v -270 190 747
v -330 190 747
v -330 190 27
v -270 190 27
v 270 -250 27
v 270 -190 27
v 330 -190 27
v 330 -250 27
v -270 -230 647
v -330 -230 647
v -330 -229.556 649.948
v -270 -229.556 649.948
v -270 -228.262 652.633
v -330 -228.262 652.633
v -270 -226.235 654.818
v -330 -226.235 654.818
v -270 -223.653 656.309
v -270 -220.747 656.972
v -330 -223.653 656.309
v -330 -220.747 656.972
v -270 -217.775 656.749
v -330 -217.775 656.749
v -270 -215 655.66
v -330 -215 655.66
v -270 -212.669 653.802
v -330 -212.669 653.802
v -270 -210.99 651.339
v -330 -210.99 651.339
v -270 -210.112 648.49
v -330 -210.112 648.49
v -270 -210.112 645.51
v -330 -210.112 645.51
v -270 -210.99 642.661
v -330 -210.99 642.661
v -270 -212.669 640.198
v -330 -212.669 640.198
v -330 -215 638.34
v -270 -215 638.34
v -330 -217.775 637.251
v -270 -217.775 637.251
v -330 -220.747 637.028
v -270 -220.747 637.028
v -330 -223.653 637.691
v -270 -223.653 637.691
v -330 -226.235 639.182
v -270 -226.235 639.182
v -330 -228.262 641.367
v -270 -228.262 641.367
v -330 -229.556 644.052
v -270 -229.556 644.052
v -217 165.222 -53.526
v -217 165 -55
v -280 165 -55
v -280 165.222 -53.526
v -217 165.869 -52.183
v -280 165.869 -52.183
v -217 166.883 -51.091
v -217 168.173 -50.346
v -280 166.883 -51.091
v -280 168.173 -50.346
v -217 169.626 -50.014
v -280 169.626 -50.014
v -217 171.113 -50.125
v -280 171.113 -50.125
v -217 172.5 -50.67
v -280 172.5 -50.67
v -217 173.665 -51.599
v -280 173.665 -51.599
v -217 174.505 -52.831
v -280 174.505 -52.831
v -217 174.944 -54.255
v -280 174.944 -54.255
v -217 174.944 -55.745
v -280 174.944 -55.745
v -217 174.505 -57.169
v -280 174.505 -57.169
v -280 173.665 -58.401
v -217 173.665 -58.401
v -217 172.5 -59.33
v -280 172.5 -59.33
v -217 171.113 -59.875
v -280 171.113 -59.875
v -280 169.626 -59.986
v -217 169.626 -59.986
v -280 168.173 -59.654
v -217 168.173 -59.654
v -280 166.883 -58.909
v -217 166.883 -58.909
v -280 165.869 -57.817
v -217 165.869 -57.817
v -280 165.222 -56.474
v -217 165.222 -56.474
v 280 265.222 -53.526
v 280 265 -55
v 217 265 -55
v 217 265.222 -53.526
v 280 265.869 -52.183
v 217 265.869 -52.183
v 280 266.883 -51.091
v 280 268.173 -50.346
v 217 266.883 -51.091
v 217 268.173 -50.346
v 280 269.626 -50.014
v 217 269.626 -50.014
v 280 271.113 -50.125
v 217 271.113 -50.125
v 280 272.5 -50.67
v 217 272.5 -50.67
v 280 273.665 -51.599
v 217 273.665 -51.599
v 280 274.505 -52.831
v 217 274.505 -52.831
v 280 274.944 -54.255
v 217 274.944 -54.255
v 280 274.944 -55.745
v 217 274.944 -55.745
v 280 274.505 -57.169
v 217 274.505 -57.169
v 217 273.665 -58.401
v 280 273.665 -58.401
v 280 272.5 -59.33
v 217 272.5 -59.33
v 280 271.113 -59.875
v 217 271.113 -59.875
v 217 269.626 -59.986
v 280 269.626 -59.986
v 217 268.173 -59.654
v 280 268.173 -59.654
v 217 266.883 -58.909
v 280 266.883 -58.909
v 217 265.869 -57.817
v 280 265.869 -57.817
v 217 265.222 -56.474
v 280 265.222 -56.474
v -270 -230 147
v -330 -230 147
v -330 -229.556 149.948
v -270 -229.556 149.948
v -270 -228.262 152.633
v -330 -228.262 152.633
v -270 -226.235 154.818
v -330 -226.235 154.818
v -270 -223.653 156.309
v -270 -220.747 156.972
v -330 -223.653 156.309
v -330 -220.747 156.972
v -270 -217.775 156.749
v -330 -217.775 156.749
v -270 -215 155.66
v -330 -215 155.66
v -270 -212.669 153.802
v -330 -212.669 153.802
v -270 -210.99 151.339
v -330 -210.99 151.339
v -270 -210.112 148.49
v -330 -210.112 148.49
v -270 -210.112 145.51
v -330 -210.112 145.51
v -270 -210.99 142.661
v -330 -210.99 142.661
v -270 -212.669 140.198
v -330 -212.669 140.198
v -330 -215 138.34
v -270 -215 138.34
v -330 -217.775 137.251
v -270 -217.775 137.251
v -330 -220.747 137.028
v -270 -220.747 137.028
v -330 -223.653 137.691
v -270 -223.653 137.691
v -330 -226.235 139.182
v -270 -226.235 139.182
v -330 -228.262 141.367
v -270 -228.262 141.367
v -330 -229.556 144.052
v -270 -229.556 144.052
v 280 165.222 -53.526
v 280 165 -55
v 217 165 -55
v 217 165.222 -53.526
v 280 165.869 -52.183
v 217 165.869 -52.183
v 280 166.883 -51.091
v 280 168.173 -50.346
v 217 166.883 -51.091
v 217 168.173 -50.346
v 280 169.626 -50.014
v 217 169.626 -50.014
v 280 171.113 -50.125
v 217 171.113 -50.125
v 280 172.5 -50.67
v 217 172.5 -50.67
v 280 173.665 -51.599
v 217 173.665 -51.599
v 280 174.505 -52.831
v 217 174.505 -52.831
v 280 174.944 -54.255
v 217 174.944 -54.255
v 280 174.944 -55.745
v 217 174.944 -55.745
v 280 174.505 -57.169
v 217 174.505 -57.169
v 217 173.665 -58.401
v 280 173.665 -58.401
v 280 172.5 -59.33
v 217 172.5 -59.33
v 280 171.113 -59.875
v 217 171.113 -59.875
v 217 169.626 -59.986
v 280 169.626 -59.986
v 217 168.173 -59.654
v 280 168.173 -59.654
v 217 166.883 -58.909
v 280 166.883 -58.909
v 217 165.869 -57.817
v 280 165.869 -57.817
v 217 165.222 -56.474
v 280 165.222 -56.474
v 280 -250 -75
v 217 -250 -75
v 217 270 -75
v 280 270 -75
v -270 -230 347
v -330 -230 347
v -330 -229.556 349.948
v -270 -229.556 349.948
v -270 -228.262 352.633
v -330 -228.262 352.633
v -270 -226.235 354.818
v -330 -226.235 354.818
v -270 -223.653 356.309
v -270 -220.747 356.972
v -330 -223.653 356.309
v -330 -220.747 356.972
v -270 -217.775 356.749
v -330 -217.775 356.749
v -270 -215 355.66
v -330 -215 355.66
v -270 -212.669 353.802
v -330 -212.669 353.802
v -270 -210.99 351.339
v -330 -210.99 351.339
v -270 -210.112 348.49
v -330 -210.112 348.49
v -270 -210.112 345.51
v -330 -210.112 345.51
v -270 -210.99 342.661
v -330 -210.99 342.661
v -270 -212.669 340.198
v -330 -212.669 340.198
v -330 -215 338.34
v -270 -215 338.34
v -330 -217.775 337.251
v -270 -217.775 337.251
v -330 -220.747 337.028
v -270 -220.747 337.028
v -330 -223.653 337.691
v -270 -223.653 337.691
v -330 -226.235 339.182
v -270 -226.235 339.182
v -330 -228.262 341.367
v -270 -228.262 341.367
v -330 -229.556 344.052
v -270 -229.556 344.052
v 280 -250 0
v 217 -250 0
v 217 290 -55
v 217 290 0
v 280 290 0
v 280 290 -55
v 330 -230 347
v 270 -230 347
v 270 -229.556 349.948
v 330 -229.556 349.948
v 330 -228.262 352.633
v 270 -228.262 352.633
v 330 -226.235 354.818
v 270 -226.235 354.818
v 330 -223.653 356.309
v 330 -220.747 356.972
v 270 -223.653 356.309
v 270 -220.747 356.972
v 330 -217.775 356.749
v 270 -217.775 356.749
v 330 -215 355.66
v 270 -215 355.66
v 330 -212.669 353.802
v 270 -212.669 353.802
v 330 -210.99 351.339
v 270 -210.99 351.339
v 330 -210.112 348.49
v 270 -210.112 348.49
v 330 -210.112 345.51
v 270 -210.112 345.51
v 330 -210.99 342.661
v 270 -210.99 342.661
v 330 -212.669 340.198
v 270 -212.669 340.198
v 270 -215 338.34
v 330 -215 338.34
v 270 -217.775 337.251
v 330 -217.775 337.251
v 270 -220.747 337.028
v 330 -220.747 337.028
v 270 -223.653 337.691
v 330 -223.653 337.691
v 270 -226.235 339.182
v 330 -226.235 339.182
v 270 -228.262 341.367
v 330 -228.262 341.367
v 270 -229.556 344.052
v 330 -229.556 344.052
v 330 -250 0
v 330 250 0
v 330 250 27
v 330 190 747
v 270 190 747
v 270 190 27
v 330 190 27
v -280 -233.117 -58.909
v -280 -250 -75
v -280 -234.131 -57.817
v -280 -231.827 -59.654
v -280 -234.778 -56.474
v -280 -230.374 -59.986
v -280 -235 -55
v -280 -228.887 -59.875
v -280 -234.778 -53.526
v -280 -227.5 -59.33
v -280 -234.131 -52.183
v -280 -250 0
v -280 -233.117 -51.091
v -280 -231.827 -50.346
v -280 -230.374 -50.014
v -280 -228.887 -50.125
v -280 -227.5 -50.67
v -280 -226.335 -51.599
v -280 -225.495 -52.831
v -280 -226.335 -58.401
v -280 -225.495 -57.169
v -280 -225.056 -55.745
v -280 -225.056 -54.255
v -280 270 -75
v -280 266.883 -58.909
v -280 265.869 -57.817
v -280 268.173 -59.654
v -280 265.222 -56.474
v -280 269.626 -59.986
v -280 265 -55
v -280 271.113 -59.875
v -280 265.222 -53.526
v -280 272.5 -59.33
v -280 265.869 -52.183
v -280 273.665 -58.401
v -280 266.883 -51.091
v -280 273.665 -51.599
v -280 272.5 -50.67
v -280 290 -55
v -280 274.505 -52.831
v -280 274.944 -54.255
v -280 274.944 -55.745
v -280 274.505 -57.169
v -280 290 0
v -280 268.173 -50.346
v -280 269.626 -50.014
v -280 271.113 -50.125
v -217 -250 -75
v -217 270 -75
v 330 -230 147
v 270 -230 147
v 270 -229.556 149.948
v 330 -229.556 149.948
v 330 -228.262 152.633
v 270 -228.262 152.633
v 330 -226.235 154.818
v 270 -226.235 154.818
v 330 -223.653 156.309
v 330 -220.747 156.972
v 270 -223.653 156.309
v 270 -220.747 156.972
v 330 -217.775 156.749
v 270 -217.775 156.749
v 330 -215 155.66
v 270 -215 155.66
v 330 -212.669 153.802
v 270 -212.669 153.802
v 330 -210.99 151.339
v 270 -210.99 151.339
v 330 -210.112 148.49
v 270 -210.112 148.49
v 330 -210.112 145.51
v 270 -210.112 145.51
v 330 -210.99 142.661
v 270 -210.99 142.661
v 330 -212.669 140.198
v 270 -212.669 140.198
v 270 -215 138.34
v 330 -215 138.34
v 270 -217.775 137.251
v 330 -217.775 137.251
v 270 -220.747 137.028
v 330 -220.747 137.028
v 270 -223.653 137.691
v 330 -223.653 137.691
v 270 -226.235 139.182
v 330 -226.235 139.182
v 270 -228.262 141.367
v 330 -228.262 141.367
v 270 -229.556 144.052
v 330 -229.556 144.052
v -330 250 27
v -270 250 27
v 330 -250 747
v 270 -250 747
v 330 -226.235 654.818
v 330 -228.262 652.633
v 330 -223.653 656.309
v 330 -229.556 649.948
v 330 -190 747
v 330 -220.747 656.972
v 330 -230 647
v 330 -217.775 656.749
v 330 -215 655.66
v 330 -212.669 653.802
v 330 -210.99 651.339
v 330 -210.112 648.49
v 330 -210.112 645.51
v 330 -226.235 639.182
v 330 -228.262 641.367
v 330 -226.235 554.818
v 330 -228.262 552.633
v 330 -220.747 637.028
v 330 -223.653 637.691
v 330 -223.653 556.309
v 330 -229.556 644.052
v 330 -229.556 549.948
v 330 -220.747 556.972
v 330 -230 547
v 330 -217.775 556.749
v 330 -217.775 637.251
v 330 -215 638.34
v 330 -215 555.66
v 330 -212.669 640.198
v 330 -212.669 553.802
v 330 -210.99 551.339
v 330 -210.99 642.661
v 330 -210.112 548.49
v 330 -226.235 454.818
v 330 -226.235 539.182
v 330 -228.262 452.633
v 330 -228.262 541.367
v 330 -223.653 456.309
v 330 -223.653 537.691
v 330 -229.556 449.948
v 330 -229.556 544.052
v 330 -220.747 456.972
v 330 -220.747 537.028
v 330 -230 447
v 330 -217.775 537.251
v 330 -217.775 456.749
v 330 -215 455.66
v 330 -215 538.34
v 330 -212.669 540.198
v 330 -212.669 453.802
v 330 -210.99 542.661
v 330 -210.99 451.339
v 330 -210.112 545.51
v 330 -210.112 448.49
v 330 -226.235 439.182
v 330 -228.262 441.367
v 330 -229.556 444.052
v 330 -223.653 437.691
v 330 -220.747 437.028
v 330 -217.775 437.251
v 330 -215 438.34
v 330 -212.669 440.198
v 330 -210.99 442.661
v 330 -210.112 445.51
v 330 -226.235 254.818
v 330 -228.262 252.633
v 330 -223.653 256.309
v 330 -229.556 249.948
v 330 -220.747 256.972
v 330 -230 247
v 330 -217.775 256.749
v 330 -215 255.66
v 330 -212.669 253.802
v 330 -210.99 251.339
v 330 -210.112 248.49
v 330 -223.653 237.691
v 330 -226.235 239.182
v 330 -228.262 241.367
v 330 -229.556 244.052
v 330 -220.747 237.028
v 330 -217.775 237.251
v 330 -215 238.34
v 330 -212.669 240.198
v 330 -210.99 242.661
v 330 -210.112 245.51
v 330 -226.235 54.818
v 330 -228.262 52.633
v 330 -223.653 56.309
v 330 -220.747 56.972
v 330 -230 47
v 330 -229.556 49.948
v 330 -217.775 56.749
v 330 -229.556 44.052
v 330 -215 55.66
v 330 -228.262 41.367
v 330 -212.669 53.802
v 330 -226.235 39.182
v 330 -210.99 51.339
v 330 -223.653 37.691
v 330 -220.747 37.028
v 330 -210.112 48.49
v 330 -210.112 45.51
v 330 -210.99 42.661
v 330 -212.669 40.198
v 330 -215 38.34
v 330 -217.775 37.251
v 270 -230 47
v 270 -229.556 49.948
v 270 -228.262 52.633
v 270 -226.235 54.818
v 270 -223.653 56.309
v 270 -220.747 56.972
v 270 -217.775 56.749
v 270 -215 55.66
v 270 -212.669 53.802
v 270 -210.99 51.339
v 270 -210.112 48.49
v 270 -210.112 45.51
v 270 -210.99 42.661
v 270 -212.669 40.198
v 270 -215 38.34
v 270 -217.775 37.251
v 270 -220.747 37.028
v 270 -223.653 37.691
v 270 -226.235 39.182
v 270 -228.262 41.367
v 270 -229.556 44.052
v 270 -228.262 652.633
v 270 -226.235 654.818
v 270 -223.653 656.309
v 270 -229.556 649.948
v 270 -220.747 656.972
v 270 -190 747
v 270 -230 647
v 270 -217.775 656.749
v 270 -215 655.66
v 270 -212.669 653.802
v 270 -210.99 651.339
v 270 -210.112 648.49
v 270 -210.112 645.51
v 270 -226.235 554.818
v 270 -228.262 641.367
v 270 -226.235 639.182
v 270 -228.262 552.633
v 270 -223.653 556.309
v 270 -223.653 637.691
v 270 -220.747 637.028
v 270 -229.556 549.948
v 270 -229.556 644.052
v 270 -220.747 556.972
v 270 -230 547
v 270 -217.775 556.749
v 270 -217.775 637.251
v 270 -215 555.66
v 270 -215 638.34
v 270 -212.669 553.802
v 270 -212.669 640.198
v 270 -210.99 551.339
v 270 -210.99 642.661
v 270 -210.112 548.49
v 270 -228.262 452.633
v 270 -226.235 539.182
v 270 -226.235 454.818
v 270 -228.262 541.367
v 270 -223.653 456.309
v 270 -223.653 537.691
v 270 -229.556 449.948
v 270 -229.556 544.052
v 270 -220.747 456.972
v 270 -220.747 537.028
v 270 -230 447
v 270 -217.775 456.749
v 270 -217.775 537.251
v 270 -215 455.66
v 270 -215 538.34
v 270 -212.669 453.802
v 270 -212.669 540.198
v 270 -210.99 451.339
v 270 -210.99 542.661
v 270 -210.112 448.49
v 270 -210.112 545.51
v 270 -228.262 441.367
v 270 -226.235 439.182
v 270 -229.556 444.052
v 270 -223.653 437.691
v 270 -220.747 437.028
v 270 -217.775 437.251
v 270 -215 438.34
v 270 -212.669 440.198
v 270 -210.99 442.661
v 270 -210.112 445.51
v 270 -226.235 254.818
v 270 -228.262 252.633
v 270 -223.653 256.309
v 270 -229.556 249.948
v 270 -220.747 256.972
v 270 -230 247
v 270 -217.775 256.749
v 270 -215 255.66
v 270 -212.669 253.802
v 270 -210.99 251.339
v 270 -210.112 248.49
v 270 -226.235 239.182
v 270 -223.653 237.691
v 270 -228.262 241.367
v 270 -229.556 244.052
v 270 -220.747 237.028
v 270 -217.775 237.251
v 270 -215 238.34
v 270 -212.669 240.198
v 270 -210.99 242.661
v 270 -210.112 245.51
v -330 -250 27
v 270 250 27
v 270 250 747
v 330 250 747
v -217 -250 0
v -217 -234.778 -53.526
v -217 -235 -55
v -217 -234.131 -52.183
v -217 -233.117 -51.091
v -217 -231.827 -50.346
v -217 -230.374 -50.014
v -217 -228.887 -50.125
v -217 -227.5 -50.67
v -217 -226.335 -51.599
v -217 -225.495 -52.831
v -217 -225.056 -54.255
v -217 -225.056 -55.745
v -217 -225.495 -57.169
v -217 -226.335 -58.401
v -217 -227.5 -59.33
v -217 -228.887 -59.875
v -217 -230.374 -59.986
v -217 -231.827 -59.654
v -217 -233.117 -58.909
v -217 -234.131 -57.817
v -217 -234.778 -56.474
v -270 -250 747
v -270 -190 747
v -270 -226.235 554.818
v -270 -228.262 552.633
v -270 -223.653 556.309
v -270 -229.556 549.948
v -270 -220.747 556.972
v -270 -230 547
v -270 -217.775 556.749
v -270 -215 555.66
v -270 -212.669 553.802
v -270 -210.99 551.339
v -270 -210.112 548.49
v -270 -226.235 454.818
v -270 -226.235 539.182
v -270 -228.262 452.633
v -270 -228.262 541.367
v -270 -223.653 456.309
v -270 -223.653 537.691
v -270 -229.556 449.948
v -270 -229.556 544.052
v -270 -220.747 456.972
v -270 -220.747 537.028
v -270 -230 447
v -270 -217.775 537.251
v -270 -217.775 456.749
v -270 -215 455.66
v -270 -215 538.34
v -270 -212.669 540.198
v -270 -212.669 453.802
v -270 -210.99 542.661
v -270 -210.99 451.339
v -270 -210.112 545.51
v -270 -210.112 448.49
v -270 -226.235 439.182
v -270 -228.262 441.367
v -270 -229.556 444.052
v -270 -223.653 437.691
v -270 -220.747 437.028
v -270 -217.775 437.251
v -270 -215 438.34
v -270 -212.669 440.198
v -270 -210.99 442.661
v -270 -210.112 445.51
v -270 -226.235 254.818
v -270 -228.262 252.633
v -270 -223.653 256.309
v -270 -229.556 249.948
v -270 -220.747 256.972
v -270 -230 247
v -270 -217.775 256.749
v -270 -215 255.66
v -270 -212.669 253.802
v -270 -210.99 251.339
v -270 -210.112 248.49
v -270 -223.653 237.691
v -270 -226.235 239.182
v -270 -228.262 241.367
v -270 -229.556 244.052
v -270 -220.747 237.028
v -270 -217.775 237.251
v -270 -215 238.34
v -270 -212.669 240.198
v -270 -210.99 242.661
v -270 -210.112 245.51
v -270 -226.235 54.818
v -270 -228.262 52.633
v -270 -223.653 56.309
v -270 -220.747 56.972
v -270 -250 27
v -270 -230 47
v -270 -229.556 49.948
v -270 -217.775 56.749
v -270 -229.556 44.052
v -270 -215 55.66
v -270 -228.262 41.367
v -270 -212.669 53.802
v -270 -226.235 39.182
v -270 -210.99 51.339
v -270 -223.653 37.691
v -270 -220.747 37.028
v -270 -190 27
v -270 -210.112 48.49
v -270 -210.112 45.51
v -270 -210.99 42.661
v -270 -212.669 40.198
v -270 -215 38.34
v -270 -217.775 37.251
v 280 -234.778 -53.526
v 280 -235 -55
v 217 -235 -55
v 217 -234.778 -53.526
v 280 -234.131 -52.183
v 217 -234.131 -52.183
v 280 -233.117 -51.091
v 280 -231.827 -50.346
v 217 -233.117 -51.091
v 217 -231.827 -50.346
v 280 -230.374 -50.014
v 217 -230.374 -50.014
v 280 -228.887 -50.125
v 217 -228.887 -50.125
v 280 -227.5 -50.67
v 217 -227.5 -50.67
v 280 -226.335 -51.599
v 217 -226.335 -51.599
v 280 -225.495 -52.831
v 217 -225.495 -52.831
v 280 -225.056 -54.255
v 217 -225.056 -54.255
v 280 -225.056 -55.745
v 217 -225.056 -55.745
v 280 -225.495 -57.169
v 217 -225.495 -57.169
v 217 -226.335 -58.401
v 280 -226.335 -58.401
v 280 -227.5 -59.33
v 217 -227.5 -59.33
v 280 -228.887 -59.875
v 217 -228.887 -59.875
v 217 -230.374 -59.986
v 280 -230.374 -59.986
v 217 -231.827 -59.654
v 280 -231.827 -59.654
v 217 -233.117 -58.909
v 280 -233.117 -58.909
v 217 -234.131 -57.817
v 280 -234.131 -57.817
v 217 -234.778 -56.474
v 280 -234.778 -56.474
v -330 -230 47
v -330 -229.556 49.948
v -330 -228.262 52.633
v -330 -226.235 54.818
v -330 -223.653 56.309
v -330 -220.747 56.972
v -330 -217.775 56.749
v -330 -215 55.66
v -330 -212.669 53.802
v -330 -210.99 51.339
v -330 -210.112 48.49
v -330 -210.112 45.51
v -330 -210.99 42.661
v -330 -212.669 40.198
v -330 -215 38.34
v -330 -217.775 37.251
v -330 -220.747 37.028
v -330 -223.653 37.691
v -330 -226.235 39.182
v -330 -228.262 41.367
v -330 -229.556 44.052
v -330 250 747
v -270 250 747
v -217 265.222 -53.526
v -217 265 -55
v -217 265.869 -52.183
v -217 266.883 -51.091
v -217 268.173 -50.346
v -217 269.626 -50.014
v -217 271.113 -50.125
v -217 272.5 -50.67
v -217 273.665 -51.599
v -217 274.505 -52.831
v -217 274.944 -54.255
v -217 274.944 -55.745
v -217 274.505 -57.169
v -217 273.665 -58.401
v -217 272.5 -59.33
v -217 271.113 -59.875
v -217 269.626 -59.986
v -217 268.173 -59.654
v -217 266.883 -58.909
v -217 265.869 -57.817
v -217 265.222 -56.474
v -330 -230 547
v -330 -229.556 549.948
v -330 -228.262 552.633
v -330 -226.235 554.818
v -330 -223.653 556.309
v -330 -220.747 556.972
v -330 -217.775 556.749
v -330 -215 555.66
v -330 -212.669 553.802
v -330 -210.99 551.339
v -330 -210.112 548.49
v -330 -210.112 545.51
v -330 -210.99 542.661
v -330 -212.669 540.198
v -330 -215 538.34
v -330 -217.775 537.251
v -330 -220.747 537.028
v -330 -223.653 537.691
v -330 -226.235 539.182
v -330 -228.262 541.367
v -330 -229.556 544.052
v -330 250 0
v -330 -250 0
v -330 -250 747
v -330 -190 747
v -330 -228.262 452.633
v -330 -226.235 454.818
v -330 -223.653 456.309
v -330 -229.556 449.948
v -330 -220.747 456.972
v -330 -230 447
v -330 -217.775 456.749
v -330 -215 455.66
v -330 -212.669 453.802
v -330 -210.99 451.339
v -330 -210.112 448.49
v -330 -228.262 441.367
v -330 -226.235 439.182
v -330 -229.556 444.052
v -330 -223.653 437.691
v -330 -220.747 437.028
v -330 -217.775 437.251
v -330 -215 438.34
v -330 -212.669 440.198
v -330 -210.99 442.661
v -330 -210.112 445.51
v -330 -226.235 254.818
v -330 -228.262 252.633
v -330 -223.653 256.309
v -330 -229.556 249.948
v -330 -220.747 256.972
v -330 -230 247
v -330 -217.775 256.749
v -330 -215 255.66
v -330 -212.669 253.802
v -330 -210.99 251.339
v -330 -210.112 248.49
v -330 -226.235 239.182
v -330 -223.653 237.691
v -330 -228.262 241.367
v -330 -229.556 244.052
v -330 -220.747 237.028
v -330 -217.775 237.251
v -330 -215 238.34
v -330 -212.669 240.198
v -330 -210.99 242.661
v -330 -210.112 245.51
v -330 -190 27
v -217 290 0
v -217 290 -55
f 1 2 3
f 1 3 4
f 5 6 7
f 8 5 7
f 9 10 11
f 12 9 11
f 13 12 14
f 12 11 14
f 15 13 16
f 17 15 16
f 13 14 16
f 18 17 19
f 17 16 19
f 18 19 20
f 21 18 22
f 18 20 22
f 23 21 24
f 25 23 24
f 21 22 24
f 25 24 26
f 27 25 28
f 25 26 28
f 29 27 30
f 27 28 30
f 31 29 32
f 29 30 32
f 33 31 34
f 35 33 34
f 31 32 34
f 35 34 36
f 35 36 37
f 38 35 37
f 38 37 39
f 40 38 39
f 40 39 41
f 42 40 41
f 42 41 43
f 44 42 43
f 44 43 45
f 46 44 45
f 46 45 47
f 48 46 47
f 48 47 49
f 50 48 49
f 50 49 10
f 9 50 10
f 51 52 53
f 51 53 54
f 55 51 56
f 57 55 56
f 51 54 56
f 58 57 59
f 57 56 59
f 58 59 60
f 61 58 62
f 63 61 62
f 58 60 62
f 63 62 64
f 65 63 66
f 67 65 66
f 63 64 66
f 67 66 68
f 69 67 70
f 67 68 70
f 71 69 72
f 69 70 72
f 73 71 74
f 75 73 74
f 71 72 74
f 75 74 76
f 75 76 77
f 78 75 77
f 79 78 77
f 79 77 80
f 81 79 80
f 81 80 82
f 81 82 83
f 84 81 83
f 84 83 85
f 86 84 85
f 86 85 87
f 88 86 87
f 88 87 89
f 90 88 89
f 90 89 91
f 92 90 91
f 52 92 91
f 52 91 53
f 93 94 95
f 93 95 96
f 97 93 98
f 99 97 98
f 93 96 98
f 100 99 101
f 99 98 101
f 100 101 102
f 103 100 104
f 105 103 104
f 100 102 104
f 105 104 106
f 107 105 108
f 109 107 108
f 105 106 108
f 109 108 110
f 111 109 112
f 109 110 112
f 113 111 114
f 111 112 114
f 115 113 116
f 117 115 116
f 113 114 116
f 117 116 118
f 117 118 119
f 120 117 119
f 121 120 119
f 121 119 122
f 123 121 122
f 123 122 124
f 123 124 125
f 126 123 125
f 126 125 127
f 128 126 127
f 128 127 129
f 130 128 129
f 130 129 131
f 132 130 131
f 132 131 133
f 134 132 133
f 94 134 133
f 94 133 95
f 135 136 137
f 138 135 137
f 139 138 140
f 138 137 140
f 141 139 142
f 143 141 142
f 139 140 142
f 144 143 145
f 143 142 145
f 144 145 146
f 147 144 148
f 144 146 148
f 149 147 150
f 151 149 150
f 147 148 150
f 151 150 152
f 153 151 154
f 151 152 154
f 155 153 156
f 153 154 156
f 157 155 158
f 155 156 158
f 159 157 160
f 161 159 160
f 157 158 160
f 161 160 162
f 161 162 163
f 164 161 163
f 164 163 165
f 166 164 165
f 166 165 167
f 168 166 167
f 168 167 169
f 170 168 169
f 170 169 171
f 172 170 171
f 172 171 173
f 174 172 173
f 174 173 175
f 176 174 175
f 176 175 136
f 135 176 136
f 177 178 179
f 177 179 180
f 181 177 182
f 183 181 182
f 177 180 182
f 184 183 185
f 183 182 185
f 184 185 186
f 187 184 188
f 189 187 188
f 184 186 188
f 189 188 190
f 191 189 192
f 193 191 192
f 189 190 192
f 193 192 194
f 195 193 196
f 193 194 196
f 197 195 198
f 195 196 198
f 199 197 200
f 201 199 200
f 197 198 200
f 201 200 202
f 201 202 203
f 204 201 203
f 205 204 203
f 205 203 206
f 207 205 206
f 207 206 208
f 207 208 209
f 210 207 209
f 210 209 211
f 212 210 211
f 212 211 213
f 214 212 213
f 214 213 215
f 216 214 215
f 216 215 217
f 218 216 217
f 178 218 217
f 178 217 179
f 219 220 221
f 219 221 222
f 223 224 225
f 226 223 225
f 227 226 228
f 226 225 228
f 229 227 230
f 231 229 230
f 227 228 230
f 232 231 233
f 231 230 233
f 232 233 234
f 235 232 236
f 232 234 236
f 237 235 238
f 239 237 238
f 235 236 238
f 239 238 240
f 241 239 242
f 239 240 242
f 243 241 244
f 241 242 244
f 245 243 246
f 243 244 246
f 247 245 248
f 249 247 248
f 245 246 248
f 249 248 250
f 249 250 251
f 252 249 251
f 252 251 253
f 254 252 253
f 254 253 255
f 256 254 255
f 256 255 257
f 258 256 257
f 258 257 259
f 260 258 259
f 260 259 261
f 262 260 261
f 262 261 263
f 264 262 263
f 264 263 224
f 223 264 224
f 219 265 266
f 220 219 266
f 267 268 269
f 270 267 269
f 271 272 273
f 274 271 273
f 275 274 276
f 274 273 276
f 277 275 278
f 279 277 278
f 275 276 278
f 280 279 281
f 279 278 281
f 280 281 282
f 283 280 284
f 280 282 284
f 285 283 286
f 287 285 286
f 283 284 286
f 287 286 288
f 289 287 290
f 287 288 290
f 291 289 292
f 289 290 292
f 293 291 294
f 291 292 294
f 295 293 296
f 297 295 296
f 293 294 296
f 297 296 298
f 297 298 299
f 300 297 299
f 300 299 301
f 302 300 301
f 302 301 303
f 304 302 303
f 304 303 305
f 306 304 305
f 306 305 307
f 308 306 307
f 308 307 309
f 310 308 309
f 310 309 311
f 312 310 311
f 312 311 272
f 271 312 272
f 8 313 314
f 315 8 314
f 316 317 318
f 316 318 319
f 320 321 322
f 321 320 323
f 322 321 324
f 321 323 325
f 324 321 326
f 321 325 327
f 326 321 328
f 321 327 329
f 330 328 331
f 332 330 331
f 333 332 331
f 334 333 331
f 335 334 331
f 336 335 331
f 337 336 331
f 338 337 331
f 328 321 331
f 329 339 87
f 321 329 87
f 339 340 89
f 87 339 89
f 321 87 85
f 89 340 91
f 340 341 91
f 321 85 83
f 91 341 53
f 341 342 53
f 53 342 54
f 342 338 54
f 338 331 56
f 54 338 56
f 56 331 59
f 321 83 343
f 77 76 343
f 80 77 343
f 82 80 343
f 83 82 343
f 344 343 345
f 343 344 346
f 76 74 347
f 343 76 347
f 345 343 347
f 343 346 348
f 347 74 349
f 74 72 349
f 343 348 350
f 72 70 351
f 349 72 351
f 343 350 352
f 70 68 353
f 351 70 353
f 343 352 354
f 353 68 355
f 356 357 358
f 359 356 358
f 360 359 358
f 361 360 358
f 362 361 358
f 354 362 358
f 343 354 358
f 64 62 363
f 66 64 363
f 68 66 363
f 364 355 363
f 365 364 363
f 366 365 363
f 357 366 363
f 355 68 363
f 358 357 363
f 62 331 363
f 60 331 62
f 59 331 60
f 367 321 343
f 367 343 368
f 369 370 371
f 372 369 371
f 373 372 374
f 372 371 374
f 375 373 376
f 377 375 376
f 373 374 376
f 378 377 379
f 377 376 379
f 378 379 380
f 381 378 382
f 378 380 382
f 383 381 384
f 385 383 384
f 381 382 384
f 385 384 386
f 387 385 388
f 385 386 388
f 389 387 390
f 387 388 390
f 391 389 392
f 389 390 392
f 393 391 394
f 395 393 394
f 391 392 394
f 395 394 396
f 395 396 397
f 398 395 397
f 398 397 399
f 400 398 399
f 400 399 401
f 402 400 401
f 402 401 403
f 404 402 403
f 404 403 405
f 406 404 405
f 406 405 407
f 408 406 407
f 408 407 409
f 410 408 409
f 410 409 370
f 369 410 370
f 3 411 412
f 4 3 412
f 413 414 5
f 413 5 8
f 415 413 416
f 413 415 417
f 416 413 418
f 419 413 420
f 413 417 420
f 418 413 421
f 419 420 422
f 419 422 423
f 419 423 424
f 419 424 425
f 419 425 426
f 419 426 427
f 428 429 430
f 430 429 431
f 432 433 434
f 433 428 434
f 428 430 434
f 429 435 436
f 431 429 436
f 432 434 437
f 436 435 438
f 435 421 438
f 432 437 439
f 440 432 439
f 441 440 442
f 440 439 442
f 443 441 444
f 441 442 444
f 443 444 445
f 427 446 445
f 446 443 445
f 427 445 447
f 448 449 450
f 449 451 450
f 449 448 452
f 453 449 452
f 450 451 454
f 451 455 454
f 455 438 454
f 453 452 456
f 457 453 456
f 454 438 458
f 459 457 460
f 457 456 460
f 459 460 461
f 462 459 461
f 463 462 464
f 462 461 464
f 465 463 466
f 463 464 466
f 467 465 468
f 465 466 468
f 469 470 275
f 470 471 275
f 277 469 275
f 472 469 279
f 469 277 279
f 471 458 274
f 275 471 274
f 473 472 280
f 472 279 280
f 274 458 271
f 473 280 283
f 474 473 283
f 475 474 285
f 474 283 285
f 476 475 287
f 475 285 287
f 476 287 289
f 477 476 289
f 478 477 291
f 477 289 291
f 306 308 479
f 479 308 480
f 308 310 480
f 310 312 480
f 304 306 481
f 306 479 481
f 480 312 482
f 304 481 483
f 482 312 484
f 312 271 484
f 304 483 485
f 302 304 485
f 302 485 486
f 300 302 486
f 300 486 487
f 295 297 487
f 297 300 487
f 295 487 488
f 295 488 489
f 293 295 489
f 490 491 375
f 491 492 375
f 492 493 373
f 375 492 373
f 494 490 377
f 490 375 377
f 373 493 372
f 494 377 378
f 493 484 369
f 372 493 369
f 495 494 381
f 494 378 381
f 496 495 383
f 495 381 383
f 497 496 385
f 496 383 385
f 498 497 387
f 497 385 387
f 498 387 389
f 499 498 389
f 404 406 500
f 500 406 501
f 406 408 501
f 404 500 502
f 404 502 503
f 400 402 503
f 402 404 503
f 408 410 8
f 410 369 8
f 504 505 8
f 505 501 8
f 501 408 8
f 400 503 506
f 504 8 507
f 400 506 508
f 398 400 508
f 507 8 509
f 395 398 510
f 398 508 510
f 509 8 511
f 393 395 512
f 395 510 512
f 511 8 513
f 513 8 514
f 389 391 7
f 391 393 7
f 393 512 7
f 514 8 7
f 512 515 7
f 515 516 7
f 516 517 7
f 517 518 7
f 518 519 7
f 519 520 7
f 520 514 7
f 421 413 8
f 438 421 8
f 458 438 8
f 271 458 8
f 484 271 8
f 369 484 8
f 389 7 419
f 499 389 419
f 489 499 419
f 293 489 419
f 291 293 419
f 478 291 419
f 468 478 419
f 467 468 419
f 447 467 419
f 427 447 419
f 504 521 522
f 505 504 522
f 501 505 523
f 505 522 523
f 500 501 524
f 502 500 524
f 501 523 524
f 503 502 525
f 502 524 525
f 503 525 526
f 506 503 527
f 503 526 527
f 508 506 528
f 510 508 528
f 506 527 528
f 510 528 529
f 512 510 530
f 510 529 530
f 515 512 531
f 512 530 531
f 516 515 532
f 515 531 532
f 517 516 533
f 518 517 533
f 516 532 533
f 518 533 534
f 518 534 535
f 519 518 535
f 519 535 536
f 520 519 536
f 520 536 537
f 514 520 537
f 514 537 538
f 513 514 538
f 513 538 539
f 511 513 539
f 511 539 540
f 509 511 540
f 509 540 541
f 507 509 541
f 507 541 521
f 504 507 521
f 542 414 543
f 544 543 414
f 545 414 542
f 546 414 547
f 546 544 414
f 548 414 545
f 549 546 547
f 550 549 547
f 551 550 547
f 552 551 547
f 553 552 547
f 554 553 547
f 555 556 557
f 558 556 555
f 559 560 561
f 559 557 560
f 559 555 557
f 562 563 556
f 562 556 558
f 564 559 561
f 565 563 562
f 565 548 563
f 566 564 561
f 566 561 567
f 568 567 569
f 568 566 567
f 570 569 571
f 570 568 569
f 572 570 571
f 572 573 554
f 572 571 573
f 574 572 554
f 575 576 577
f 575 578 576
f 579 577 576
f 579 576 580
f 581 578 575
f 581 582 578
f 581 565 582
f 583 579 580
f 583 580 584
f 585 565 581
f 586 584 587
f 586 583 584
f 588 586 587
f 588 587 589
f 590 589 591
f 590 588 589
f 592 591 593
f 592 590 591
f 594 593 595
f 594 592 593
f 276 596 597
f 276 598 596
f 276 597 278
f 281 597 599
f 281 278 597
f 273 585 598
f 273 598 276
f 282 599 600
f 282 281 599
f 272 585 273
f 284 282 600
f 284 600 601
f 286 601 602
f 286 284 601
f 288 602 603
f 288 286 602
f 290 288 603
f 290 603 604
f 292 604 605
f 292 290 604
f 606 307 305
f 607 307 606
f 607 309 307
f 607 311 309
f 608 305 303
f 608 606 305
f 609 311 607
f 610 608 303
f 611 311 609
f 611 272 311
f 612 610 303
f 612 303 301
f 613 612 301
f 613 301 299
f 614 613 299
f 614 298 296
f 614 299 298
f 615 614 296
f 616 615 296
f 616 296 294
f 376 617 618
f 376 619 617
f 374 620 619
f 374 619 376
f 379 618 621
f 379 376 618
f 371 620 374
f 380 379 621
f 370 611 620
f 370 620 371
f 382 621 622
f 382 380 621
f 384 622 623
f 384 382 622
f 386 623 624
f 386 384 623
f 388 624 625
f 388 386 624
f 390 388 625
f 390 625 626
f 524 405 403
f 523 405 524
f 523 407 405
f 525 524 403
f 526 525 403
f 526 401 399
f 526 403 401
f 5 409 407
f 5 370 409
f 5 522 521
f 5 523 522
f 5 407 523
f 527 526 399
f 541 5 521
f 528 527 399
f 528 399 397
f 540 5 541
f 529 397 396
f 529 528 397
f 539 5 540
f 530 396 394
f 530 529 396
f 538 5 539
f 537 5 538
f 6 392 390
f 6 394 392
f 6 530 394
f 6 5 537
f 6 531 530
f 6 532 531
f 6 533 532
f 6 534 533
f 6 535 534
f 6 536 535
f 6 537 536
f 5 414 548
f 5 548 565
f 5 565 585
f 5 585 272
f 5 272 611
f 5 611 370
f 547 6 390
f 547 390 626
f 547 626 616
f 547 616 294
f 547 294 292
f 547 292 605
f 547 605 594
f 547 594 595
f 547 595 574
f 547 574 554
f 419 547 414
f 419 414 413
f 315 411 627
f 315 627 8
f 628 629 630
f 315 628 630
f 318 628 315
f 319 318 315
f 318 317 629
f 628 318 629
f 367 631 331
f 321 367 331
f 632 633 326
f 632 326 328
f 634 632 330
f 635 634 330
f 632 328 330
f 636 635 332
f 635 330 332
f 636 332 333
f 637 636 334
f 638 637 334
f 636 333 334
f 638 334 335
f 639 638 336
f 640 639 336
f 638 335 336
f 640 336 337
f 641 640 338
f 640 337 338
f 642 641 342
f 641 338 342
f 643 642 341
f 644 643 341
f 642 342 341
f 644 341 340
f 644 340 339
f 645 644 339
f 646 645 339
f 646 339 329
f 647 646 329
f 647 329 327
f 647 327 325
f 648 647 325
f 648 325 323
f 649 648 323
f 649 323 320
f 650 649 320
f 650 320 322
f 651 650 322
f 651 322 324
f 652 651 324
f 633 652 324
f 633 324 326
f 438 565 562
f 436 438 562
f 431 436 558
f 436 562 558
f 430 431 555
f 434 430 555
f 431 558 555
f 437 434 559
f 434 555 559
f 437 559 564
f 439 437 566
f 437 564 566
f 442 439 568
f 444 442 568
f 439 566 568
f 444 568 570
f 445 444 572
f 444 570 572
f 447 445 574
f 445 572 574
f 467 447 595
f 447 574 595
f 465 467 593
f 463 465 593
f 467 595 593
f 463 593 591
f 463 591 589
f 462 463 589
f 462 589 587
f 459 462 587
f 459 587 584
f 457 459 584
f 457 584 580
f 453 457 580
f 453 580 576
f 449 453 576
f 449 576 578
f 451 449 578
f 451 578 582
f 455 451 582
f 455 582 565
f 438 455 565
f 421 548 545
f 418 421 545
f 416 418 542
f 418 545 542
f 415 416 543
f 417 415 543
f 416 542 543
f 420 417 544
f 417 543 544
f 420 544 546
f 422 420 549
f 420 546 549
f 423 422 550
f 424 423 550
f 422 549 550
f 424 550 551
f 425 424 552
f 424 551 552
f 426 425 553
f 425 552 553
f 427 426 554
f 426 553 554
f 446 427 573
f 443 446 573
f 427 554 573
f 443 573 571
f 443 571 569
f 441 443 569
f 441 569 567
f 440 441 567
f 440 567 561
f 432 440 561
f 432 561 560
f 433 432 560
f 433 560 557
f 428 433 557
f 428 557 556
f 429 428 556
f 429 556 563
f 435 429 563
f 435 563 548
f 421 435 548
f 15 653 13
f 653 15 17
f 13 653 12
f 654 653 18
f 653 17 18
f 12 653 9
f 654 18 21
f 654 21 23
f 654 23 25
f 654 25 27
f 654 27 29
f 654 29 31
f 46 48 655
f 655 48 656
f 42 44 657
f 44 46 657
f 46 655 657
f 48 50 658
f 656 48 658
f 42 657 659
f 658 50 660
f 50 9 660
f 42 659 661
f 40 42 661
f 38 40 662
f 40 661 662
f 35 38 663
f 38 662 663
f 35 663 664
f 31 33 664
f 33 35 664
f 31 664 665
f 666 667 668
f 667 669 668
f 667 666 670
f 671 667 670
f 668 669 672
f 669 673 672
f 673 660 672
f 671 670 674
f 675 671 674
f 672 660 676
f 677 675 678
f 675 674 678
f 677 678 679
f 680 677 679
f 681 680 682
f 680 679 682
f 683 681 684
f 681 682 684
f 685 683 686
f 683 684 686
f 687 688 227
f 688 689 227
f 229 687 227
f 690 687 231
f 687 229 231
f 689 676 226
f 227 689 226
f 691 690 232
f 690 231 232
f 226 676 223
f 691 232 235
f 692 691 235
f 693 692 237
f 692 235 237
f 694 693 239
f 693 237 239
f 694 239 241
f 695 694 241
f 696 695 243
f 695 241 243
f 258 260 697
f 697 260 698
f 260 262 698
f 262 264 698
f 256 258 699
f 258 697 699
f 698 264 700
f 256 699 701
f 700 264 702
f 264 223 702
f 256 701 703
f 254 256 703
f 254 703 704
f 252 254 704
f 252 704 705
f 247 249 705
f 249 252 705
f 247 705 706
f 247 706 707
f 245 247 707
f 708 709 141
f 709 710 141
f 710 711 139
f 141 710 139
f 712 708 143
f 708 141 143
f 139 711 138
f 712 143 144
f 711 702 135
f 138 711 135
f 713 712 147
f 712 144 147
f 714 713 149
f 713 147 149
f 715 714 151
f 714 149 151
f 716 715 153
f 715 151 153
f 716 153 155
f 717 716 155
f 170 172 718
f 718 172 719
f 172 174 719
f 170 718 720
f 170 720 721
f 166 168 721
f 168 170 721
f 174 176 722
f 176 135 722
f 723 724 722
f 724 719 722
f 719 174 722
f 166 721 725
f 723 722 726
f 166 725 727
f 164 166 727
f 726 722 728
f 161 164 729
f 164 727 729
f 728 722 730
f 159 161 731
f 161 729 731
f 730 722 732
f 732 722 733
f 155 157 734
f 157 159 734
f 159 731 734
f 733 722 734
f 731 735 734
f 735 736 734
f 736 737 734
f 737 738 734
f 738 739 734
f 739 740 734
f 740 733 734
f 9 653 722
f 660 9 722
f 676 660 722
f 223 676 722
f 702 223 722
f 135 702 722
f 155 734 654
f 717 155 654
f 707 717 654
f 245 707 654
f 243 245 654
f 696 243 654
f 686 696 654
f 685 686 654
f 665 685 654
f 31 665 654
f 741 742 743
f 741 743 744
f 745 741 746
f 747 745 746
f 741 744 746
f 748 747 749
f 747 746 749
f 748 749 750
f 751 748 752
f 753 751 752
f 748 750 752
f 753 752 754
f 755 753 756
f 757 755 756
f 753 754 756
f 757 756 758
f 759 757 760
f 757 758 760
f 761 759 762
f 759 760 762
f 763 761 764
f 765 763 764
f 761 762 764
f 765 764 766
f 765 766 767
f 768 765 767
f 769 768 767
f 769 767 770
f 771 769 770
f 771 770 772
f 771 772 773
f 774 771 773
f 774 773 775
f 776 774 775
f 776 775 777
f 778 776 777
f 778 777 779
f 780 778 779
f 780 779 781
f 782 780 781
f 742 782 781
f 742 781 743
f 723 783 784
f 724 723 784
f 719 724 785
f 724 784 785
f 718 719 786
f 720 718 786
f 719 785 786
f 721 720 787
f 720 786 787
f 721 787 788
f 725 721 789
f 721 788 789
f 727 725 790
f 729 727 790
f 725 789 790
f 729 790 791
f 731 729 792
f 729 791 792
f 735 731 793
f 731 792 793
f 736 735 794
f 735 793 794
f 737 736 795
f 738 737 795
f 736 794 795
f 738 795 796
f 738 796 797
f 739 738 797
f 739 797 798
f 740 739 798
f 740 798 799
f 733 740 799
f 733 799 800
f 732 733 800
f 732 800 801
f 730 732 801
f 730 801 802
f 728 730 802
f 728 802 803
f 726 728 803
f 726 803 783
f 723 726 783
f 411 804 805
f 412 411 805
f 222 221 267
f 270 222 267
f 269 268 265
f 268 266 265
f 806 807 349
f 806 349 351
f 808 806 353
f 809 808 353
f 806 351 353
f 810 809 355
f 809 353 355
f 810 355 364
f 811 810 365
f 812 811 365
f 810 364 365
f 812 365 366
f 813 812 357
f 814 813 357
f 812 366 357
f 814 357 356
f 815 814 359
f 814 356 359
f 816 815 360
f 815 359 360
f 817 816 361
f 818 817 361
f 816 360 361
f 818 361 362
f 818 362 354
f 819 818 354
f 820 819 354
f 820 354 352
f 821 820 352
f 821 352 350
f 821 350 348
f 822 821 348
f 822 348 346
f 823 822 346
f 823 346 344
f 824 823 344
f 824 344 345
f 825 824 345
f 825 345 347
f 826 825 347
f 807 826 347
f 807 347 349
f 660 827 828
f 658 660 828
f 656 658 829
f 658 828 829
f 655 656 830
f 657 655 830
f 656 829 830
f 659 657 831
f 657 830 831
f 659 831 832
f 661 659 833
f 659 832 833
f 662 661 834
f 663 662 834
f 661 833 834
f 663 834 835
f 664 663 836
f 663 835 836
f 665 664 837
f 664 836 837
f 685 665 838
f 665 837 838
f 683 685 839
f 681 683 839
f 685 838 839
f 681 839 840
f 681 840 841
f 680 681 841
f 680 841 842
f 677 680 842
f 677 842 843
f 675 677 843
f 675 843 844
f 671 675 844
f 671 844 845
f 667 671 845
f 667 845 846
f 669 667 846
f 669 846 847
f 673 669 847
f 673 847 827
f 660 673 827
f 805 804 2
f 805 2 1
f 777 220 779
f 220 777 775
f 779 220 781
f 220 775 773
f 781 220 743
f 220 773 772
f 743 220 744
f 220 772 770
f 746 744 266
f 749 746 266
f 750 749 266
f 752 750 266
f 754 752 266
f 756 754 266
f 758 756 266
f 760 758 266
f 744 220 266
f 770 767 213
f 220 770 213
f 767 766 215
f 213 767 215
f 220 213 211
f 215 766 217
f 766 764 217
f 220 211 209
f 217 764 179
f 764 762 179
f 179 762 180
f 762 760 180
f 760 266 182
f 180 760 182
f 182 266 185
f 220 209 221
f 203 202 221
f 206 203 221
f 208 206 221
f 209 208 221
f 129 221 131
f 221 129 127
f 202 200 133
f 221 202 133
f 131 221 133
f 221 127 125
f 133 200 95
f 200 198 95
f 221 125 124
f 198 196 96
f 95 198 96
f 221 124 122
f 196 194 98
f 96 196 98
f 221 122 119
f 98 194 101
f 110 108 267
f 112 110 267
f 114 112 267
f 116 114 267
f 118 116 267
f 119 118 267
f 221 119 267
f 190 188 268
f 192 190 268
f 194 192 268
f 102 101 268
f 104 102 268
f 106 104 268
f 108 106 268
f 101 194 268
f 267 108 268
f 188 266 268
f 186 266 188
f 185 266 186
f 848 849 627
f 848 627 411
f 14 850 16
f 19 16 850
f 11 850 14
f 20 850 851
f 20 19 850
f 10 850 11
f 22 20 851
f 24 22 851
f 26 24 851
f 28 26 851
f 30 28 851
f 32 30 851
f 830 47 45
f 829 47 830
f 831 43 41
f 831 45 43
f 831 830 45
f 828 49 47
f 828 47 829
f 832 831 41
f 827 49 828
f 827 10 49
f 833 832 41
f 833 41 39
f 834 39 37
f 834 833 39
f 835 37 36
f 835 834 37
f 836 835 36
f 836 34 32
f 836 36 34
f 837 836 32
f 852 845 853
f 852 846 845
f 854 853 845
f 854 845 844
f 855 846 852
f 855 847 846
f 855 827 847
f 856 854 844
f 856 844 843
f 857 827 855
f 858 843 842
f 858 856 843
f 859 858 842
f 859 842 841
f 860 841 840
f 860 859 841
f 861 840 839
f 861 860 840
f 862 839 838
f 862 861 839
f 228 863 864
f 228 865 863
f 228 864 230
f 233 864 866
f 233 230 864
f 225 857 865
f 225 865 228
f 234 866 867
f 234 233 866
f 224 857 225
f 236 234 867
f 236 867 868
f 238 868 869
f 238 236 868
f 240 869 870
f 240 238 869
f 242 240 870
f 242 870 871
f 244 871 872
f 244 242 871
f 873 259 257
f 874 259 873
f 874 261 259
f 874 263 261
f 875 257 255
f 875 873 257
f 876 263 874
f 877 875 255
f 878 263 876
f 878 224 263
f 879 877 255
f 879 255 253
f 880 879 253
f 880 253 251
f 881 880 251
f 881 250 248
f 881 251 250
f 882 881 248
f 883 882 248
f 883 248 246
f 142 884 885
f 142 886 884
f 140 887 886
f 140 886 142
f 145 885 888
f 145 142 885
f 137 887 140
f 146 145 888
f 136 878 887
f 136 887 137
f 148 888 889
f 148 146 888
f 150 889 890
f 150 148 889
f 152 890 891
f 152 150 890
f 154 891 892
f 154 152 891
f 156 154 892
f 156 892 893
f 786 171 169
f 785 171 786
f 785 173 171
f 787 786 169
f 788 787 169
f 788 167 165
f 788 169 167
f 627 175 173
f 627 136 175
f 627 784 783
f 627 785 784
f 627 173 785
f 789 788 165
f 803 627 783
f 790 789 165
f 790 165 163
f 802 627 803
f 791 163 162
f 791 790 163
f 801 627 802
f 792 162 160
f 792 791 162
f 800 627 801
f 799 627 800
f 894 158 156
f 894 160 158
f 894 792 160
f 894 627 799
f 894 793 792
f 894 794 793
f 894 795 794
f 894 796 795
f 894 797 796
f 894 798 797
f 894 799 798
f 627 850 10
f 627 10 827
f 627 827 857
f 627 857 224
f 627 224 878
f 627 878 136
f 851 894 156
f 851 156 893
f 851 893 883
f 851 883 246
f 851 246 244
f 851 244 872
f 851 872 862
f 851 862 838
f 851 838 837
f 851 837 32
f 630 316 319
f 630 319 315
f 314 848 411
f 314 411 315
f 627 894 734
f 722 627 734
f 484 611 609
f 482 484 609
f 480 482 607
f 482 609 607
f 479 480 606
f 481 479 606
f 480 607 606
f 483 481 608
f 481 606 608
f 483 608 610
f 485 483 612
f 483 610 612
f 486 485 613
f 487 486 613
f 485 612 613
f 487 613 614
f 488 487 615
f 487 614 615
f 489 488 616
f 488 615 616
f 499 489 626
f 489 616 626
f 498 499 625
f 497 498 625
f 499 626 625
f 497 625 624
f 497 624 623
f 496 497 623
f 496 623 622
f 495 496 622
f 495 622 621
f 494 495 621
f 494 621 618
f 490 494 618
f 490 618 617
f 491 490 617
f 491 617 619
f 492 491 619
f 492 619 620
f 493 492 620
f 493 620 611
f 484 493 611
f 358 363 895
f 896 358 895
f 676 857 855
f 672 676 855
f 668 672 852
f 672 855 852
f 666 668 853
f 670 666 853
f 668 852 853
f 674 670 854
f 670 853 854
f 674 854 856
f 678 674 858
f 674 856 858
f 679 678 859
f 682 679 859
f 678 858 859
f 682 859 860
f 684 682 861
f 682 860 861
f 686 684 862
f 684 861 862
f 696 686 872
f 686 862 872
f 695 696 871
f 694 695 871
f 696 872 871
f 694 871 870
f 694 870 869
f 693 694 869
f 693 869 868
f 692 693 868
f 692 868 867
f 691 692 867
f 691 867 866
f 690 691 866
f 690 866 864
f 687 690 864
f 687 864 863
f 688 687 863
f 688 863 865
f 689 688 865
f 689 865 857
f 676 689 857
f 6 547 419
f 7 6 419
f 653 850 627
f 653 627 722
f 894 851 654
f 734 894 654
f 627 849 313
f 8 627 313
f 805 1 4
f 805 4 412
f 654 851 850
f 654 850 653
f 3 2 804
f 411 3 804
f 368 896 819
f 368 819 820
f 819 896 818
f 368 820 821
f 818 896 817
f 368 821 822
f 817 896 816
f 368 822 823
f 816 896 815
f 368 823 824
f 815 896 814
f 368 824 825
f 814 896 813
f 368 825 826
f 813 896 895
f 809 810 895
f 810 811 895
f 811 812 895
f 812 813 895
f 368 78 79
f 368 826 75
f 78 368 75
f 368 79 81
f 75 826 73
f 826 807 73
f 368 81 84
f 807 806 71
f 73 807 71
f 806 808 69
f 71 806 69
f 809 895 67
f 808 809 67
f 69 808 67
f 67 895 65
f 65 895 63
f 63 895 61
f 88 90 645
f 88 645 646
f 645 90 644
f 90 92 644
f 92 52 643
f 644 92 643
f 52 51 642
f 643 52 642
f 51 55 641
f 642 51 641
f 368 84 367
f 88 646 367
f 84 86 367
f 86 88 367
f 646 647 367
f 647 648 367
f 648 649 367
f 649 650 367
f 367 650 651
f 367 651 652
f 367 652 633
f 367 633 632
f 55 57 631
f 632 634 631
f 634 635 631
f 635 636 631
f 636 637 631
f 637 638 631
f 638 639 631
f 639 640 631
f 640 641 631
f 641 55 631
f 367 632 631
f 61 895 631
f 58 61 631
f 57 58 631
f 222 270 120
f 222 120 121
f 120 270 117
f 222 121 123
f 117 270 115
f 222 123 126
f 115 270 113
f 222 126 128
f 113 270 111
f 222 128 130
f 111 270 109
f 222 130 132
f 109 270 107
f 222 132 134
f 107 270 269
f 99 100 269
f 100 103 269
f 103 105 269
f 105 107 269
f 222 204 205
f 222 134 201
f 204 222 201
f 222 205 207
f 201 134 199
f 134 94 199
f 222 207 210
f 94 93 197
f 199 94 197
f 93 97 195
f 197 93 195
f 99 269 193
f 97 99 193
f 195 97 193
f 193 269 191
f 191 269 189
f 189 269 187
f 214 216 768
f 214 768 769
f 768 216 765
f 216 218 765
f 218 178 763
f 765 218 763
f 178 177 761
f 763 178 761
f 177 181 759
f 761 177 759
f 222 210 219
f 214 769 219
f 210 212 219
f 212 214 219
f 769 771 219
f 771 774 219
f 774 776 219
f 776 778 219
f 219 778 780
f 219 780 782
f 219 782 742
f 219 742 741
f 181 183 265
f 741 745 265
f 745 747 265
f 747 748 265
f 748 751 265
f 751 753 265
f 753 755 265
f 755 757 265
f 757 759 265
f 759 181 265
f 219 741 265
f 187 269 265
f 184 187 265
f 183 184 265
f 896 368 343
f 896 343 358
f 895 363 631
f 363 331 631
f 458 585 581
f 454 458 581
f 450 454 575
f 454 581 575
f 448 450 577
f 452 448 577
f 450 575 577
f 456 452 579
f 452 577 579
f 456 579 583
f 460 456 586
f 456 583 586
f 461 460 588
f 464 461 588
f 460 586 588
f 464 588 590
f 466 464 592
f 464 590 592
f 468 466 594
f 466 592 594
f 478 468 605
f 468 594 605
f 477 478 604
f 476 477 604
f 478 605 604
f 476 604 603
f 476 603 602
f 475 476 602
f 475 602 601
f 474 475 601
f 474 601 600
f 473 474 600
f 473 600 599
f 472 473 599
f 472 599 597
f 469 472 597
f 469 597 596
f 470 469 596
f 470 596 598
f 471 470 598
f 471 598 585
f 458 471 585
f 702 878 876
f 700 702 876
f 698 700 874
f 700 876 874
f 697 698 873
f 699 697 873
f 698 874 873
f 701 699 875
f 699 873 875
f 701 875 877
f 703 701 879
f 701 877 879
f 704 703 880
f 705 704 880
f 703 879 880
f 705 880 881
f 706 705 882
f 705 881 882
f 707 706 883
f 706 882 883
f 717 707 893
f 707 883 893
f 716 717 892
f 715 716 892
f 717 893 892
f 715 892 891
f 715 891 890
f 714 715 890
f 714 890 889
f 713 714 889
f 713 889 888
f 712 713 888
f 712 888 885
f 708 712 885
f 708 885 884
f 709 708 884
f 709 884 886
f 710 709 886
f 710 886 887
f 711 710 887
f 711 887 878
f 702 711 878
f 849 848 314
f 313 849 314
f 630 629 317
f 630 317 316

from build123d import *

# Parameters (mm, degrees)
F0_W      = 660
F0_H      = 500
F1_DEPTH  = 27
F2_W      = 60
F2_H      = 60
F3_DEPTH  = 720
F4_W      = 63
F4_H      = 63
F4_H_2    = 40
F4_H_3    = 33
F5_DEPTH  = 75
F6_R      = 5
F7_DEPTH  = 610.001
F9_R      = 5
F10_DEPTH = 610.001
F12_DEPTH = 610.001
F8_R      = 10
F13_DEPTH = 660.001


# Not quite as in the source:
# - a feature names something its author has since deleted; it is built from what else it names


with BuildPart() as f1:
    # F0 (on Top) → F1 (new body)
    with BuildSketch(Plane.XY):
        Rectangle(F0_W, F0_H)
    extrude(amount=F1_DEPTH)


with BuildPart() as f3:
    # F2 (on face) → F3 (new body)
    with BuildSketch(Plane.XY.offset(27)):
        with Locations((-300, 220)):
            Rectangle(F2_W, F2_H)
    extrude(amount=F3_DEPTH)


with BuildPart() as f3b:
    # F2 (on face) → F3, piece 2 (new body)
    with BuildSketch(Plane.XY.offset(27)):
        with Locations((300, 220)):
            Rectangle(F2_W, F2_H)
    extrude(amount=F3_DEPTH)


with BuildPart() as f3c:
    # F2 (on face) → F3, piece 3 (new body)
    with BuildSketch(Plane.XY.offset(27)):
        with Locations((300, -220)):
            Rectangle(F2_W, F2_H)
    extrude(amount=F3_DEPTH)


with BuildPart() as f3d:
    # F2 (on face) → F3, piece 4 (new body)
    with BuildSketch(Plane.XY.offset(27)):
        with Locations((-300, -220)):
            Rectangle(F2_W, F2_H)
    extrude(amount=F3_DEPTH)


with BuildPart() as f5:
    # F4 (on face) → F5 (new body)
    with BuildSketch(Plane(origin=(0, 0, 0), x_dir=(1, 0, 0), z_dir=(0, 0, -1))):
        with Locations((-248.5, -218.5)):
            Rectangle(F4_W, F4_H)
        with Locations((-248.5, -270)):
            Rectangle(F4_W, F4_H_2)
        Polygon((-280, 217), (-280, -154), (-217, -154), (-217, 217), (-217, 250), (-280, 250), align=None)
        with Locations((-248.5, -170.5)):
            Rectangle(F4_W, F4_H_3)
    extrude(amount=F5_DEPTH)


with BuildPart() as f5b:
    # F4 (on face) → F5, piece 2 (new body)
    with BuildSketch(Plane(origin=(0, 0, 0), x_dir=(1, 0, 0), z_dir=(0, 0, -1))):
        with Locations((248.5, -270)):
            Rectangle(F4_W, F4_H_2)
        with Locations((248.5, -218.5)):
            Rectangle(F4_W, F4_H)
        Polygon((217, 217), (217, -154), (280, -154), (280, 217), (280, 250), (217, 250), align=None)
        with Locations((248.5, -170.5)):
            Rectangle(F4_W, F4_H_3)
    extrude(amount=F5_DEPTH)


with BuildPart() as f7_tool:
    # F6 (on face) → F7 (new body, through all)
    with BuildSketch(Plane(origin=(-280, 0, 0), x_dir=(0, -1, 0), z_dir=(-1, 0, 0))):
        with Locations((-270, -55)):
            Circle(F6_R)
    extrude(amount=-F7_DEPTH)


with BuildPart() as f5_1:
    add(f5.part)

    # F7: cut by f7_tool
    add(f7_tool.part, mode=Mode.SUBTRACT)


with BuildPart() as f5b_1:
    add(f5b.part)

    # F7: cut by f7_tool
    add(f7_tool.part, mode=Mode.SUBTRACT)


with BuildPart() as f10_tool:
    # F9 (on face) → F10 (new body, through all)
    with BuildSketch(Plane(origin=(-280, 0, 0), x_dir=(0, -1, 0), z_dir=(-1, 0, 0))):
        with Locations((230, -55)):
            Circle(F9_R)
        with Locations((-170, -55)):
            Circle(F9_R)
    extrude(amount=-F10_DEPTH)


with BuildPart() as f5_2:
    add(f5_1.part)

    # F10: cut by f10_tool
    add(f10_tool.part, mode=Mode.SUBTRACT)


with BuildPart() as f5b_2:
    add(f5b_1.part)

    # F10: cut by f10_tool
    add(f10_tool.part, mode=Mode.SUBTRACT)


with BuildPart() as f12_tool:
    # F11 (on face) → F12 (new body, through all)
    with BuildSketch(Plane(origin=(-280, 0, 0), x_dir=(0, -1, 0), z_dir=(-1, 0, 0))):
        Polygon((-290, -55), (-290, -75), (-270, -75), align=None)
    extrude(amount=-F12_DEPTH)


with BuildPart() as f5_3:
    add(f5_2.part)

    # F12: cut by f12_tool
    add(f12_tool.part, mode=Mode.SUBTRACT)


with BuildPart() as f5b_3:
    add(f5b_2.part)

    # F12: cut by f12_tool
    add(f12_tool.part, mode=Mode.SUBTRACT)


with BuildPart() as f13_tool:
    # F8 (on face) → F13 (new body, through all)
    with BuildSketch(Plane(origin=(-330, 0, 0), x_dir=(0, -1, 0), z_dir=(-1, 0, 0))):
        with Locations((220, 647)):
            Circle(F8_R)
        with Locations((220, 547)):
            Circle(F8_R)
        with Locations((220, 447)):
            Circle(F8_R)
        with Locations((220, 347)):
            Circle(F8_R)
        with Locations((220, 247)):
            Circle(F8_R)
        with Locations((-220, 647)):
            Circle(F8_R)
        with Locations((-220, 547)):
            Circle(F8_R)
        with Locations((-220, 447)):
            Circle(F8_R)
        with Locations((-220, 347)):
            Circle(F8_R)
        with Locations((-220, 247)):
            Circle(F8_R)
        with Locations((-220, 147)):
            Circle(F8_R)
        with Locations((-220, 47)):
            Circle(F8_R)
        with Locations((220, 147)):
            Circle(F8_R)
        with Locations((220, 47)):
            Circle(F8_R)
    extrude(amount=-F13_DEPTH)


with BuildPart() as f3c_1:
    add(f3c.part)

    # F13: cut by f13_tool
    add(f13_tool.part, mode=Mode.SUBTRACT)


with BuildPart() as f3d_1:
    add(f3d.part)

    # F13: cut by f13_tool
    add(f13_tool.part, mode=Mode.SUBTRACT)


solid = Compound([f1.part, f3.part, f3b.part, f5_3.part, f5b_3.part, f3c_1.part, f3d_1.part])
